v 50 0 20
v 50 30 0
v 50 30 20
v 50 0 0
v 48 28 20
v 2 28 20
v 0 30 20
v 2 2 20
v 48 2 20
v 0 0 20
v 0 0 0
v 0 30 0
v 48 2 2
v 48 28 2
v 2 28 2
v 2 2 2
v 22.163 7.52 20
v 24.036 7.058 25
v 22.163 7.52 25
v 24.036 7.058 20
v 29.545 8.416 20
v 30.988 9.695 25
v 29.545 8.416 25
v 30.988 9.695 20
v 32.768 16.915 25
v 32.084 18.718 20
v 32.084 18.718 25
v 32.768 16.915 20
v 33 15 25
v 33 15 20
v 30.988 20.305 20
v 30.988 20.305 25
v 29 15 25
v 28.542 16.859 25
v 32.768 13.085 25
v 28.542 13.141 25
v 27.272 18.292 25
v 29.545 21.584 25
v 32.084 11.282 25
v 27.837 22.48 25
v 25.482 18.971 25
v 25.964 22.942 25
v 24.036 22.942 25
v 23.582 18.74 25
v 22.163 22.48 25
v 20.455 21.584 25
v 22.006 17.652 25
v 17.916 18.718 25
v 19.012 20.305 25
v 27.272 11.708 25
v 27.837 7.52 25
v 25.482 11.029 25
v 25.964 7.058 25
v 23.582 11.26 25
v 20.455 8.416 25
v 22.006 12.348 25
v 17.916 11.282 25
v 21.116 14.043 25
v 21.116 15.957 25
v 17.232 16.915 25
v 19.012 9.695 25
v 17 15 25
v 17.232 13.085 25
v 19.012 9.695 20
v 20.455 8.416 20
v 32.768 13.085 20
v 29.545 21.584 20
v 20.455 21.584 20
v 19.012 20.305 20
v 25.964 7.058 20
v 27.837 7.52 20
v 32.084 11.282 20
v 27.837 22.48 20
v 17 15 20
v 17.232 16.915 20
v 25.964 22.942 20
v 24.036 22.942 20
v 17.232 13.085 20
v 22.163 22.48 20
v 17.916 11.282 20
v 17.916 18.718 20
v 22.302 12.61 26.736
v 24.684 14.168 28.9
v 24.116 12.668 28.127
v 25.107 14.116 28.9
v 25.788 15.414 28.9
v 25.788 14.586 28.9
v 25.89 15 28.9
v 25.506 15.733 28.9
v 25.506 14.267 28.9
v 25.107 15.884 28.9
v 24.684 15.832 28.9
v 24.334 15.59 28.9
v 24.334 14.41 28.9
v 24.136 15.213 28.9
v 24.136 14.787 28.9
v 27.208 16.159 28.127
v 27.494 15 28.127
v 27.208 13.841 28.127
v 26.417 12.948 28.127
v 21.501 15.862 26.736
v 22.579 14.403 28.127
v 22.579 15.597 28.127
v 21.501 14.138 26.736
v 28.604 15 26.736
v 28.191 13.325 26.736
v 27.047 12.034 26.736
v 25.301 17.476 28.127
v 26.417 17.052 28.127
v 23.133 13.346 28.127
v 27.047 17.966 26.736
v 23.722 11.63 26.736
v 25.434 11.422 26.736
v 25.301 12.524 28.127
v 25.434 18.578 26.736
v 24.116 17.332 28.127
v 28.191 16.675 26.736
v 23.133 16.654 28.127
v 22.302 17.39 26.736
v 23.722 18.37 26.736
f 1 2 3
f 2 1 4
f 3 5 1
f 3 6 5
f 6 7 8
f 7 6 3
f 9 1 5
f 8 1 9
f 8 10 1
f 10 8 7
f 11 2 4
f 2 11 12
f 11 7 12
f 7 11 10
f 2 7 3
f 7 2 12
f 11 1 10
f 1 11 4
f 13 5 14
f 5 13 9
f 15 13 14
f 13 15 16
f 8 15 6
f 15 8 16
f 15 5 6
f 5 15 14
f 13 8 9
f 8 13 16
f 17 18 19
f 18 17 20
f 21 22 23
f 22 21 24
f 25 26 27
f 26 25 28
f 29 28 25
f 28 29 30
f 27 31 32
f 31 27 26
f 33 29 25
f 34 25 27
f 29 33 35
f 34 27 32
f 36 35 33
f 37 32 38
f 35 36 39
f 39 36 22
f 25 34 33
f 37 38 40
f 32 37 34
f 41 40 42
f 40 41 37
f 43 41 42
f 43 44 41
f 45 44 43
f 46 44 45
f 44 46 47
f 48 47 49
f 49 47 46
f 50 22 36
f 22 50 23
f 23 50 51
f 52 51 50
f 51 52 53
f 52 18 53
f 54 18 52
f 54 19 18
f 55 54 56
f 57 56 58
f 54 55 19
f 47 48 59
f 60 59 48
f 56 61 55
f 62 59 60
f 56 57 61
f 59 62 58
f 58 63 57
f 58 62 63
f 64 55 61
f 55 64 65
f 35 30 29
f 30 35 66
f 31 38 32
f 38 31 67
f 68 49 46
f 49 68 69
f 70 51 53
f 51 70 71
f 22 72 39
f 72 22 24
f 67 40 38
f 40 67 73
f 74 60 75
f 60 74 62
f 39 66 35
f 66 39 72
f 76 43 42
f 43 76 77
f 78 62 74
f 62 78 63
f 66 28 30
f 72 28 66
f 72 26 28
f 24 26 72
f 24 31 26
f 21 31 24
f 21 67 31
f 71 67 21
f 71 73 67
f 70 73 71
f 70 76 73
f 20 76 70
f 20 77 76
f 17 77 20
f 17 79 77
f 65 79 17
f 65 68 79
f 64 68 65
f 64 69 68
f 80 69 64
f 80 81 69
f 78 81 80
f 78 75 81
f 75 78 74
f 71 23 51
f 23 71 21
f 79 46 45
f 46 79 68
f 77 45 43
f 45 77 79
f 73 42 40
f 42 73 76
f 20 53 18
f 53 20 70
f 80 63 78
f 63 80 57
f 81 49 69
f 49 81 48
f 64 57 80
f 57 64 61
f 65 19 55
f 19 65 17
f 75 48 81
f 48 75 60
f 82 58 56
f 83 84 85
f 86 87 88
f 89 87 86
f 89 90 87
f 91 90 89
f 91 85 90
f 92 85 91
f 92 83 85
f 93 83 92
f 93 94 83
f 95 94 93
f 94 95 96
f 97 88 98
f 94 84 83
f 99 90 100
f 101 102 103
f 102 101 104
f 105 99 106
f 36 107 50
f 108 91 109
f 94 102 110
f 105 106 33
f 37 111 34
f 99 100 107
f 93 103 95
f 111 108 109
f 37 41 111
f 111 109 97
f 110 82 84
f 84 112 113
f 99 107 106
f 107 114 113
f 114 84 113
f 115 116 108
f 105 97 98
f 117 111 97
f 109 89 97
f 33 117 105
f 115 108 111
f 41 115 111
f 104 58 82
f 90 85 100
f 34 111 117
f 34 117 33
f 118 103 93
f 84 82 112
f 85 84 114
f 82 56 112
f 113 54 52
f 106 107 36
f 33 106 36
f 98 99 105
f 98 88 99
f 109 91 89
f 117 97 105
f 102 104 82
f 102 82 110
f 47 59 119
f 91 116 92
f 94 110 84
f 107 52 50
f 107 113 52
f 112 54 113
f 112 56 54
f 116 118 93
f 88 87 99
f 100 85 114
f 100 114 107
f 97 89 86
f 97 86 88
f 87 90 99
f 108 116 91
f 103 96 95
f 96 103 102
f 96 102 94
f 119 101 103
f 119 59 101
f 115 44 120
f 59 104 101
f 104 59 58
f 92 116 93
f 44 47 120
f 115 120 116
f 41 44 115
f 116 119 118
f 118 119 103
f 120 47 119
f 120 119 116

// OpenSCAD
// file: lib/shapes.scad
// Custom shapes library

module custom_knob() {
    cylinder(h=5, r=8);
    translate([0, 0, 5])
        sphere(r=4);
}

module rounded_cube(size, radius=2) {
    hull() {
        for (x = [radius, size[0]-radius]) {
            for (y = [radius, size[1]-radius]) {
                for (z = [radius, size[2]-radius]) {
                    translate([x, y, z])
                        sphere(r=radius);
                }
            }
        }
    }
}
// main file
// More complex model with modules
include <lib/shapes.scad>

// Parameters
wall_thickness = 2;
box_size = [50, 30, 20];

// Main model
difference() {
    // Outer box
    cube(box_size);
    
    // Inner cavity
    translate([wall_thickness, wall_thickness, wall_thickness])
        cube([
            box_size[0] - 2*wall_thickness,
            box_size[1] - 2*wall_thickness,
            box_size[2] - wall_thickness
        ]);
}

// Add decorative elements
translate([box_size[0]/2, box_size[1]/2, box_size[2]])
    custom_knob();
